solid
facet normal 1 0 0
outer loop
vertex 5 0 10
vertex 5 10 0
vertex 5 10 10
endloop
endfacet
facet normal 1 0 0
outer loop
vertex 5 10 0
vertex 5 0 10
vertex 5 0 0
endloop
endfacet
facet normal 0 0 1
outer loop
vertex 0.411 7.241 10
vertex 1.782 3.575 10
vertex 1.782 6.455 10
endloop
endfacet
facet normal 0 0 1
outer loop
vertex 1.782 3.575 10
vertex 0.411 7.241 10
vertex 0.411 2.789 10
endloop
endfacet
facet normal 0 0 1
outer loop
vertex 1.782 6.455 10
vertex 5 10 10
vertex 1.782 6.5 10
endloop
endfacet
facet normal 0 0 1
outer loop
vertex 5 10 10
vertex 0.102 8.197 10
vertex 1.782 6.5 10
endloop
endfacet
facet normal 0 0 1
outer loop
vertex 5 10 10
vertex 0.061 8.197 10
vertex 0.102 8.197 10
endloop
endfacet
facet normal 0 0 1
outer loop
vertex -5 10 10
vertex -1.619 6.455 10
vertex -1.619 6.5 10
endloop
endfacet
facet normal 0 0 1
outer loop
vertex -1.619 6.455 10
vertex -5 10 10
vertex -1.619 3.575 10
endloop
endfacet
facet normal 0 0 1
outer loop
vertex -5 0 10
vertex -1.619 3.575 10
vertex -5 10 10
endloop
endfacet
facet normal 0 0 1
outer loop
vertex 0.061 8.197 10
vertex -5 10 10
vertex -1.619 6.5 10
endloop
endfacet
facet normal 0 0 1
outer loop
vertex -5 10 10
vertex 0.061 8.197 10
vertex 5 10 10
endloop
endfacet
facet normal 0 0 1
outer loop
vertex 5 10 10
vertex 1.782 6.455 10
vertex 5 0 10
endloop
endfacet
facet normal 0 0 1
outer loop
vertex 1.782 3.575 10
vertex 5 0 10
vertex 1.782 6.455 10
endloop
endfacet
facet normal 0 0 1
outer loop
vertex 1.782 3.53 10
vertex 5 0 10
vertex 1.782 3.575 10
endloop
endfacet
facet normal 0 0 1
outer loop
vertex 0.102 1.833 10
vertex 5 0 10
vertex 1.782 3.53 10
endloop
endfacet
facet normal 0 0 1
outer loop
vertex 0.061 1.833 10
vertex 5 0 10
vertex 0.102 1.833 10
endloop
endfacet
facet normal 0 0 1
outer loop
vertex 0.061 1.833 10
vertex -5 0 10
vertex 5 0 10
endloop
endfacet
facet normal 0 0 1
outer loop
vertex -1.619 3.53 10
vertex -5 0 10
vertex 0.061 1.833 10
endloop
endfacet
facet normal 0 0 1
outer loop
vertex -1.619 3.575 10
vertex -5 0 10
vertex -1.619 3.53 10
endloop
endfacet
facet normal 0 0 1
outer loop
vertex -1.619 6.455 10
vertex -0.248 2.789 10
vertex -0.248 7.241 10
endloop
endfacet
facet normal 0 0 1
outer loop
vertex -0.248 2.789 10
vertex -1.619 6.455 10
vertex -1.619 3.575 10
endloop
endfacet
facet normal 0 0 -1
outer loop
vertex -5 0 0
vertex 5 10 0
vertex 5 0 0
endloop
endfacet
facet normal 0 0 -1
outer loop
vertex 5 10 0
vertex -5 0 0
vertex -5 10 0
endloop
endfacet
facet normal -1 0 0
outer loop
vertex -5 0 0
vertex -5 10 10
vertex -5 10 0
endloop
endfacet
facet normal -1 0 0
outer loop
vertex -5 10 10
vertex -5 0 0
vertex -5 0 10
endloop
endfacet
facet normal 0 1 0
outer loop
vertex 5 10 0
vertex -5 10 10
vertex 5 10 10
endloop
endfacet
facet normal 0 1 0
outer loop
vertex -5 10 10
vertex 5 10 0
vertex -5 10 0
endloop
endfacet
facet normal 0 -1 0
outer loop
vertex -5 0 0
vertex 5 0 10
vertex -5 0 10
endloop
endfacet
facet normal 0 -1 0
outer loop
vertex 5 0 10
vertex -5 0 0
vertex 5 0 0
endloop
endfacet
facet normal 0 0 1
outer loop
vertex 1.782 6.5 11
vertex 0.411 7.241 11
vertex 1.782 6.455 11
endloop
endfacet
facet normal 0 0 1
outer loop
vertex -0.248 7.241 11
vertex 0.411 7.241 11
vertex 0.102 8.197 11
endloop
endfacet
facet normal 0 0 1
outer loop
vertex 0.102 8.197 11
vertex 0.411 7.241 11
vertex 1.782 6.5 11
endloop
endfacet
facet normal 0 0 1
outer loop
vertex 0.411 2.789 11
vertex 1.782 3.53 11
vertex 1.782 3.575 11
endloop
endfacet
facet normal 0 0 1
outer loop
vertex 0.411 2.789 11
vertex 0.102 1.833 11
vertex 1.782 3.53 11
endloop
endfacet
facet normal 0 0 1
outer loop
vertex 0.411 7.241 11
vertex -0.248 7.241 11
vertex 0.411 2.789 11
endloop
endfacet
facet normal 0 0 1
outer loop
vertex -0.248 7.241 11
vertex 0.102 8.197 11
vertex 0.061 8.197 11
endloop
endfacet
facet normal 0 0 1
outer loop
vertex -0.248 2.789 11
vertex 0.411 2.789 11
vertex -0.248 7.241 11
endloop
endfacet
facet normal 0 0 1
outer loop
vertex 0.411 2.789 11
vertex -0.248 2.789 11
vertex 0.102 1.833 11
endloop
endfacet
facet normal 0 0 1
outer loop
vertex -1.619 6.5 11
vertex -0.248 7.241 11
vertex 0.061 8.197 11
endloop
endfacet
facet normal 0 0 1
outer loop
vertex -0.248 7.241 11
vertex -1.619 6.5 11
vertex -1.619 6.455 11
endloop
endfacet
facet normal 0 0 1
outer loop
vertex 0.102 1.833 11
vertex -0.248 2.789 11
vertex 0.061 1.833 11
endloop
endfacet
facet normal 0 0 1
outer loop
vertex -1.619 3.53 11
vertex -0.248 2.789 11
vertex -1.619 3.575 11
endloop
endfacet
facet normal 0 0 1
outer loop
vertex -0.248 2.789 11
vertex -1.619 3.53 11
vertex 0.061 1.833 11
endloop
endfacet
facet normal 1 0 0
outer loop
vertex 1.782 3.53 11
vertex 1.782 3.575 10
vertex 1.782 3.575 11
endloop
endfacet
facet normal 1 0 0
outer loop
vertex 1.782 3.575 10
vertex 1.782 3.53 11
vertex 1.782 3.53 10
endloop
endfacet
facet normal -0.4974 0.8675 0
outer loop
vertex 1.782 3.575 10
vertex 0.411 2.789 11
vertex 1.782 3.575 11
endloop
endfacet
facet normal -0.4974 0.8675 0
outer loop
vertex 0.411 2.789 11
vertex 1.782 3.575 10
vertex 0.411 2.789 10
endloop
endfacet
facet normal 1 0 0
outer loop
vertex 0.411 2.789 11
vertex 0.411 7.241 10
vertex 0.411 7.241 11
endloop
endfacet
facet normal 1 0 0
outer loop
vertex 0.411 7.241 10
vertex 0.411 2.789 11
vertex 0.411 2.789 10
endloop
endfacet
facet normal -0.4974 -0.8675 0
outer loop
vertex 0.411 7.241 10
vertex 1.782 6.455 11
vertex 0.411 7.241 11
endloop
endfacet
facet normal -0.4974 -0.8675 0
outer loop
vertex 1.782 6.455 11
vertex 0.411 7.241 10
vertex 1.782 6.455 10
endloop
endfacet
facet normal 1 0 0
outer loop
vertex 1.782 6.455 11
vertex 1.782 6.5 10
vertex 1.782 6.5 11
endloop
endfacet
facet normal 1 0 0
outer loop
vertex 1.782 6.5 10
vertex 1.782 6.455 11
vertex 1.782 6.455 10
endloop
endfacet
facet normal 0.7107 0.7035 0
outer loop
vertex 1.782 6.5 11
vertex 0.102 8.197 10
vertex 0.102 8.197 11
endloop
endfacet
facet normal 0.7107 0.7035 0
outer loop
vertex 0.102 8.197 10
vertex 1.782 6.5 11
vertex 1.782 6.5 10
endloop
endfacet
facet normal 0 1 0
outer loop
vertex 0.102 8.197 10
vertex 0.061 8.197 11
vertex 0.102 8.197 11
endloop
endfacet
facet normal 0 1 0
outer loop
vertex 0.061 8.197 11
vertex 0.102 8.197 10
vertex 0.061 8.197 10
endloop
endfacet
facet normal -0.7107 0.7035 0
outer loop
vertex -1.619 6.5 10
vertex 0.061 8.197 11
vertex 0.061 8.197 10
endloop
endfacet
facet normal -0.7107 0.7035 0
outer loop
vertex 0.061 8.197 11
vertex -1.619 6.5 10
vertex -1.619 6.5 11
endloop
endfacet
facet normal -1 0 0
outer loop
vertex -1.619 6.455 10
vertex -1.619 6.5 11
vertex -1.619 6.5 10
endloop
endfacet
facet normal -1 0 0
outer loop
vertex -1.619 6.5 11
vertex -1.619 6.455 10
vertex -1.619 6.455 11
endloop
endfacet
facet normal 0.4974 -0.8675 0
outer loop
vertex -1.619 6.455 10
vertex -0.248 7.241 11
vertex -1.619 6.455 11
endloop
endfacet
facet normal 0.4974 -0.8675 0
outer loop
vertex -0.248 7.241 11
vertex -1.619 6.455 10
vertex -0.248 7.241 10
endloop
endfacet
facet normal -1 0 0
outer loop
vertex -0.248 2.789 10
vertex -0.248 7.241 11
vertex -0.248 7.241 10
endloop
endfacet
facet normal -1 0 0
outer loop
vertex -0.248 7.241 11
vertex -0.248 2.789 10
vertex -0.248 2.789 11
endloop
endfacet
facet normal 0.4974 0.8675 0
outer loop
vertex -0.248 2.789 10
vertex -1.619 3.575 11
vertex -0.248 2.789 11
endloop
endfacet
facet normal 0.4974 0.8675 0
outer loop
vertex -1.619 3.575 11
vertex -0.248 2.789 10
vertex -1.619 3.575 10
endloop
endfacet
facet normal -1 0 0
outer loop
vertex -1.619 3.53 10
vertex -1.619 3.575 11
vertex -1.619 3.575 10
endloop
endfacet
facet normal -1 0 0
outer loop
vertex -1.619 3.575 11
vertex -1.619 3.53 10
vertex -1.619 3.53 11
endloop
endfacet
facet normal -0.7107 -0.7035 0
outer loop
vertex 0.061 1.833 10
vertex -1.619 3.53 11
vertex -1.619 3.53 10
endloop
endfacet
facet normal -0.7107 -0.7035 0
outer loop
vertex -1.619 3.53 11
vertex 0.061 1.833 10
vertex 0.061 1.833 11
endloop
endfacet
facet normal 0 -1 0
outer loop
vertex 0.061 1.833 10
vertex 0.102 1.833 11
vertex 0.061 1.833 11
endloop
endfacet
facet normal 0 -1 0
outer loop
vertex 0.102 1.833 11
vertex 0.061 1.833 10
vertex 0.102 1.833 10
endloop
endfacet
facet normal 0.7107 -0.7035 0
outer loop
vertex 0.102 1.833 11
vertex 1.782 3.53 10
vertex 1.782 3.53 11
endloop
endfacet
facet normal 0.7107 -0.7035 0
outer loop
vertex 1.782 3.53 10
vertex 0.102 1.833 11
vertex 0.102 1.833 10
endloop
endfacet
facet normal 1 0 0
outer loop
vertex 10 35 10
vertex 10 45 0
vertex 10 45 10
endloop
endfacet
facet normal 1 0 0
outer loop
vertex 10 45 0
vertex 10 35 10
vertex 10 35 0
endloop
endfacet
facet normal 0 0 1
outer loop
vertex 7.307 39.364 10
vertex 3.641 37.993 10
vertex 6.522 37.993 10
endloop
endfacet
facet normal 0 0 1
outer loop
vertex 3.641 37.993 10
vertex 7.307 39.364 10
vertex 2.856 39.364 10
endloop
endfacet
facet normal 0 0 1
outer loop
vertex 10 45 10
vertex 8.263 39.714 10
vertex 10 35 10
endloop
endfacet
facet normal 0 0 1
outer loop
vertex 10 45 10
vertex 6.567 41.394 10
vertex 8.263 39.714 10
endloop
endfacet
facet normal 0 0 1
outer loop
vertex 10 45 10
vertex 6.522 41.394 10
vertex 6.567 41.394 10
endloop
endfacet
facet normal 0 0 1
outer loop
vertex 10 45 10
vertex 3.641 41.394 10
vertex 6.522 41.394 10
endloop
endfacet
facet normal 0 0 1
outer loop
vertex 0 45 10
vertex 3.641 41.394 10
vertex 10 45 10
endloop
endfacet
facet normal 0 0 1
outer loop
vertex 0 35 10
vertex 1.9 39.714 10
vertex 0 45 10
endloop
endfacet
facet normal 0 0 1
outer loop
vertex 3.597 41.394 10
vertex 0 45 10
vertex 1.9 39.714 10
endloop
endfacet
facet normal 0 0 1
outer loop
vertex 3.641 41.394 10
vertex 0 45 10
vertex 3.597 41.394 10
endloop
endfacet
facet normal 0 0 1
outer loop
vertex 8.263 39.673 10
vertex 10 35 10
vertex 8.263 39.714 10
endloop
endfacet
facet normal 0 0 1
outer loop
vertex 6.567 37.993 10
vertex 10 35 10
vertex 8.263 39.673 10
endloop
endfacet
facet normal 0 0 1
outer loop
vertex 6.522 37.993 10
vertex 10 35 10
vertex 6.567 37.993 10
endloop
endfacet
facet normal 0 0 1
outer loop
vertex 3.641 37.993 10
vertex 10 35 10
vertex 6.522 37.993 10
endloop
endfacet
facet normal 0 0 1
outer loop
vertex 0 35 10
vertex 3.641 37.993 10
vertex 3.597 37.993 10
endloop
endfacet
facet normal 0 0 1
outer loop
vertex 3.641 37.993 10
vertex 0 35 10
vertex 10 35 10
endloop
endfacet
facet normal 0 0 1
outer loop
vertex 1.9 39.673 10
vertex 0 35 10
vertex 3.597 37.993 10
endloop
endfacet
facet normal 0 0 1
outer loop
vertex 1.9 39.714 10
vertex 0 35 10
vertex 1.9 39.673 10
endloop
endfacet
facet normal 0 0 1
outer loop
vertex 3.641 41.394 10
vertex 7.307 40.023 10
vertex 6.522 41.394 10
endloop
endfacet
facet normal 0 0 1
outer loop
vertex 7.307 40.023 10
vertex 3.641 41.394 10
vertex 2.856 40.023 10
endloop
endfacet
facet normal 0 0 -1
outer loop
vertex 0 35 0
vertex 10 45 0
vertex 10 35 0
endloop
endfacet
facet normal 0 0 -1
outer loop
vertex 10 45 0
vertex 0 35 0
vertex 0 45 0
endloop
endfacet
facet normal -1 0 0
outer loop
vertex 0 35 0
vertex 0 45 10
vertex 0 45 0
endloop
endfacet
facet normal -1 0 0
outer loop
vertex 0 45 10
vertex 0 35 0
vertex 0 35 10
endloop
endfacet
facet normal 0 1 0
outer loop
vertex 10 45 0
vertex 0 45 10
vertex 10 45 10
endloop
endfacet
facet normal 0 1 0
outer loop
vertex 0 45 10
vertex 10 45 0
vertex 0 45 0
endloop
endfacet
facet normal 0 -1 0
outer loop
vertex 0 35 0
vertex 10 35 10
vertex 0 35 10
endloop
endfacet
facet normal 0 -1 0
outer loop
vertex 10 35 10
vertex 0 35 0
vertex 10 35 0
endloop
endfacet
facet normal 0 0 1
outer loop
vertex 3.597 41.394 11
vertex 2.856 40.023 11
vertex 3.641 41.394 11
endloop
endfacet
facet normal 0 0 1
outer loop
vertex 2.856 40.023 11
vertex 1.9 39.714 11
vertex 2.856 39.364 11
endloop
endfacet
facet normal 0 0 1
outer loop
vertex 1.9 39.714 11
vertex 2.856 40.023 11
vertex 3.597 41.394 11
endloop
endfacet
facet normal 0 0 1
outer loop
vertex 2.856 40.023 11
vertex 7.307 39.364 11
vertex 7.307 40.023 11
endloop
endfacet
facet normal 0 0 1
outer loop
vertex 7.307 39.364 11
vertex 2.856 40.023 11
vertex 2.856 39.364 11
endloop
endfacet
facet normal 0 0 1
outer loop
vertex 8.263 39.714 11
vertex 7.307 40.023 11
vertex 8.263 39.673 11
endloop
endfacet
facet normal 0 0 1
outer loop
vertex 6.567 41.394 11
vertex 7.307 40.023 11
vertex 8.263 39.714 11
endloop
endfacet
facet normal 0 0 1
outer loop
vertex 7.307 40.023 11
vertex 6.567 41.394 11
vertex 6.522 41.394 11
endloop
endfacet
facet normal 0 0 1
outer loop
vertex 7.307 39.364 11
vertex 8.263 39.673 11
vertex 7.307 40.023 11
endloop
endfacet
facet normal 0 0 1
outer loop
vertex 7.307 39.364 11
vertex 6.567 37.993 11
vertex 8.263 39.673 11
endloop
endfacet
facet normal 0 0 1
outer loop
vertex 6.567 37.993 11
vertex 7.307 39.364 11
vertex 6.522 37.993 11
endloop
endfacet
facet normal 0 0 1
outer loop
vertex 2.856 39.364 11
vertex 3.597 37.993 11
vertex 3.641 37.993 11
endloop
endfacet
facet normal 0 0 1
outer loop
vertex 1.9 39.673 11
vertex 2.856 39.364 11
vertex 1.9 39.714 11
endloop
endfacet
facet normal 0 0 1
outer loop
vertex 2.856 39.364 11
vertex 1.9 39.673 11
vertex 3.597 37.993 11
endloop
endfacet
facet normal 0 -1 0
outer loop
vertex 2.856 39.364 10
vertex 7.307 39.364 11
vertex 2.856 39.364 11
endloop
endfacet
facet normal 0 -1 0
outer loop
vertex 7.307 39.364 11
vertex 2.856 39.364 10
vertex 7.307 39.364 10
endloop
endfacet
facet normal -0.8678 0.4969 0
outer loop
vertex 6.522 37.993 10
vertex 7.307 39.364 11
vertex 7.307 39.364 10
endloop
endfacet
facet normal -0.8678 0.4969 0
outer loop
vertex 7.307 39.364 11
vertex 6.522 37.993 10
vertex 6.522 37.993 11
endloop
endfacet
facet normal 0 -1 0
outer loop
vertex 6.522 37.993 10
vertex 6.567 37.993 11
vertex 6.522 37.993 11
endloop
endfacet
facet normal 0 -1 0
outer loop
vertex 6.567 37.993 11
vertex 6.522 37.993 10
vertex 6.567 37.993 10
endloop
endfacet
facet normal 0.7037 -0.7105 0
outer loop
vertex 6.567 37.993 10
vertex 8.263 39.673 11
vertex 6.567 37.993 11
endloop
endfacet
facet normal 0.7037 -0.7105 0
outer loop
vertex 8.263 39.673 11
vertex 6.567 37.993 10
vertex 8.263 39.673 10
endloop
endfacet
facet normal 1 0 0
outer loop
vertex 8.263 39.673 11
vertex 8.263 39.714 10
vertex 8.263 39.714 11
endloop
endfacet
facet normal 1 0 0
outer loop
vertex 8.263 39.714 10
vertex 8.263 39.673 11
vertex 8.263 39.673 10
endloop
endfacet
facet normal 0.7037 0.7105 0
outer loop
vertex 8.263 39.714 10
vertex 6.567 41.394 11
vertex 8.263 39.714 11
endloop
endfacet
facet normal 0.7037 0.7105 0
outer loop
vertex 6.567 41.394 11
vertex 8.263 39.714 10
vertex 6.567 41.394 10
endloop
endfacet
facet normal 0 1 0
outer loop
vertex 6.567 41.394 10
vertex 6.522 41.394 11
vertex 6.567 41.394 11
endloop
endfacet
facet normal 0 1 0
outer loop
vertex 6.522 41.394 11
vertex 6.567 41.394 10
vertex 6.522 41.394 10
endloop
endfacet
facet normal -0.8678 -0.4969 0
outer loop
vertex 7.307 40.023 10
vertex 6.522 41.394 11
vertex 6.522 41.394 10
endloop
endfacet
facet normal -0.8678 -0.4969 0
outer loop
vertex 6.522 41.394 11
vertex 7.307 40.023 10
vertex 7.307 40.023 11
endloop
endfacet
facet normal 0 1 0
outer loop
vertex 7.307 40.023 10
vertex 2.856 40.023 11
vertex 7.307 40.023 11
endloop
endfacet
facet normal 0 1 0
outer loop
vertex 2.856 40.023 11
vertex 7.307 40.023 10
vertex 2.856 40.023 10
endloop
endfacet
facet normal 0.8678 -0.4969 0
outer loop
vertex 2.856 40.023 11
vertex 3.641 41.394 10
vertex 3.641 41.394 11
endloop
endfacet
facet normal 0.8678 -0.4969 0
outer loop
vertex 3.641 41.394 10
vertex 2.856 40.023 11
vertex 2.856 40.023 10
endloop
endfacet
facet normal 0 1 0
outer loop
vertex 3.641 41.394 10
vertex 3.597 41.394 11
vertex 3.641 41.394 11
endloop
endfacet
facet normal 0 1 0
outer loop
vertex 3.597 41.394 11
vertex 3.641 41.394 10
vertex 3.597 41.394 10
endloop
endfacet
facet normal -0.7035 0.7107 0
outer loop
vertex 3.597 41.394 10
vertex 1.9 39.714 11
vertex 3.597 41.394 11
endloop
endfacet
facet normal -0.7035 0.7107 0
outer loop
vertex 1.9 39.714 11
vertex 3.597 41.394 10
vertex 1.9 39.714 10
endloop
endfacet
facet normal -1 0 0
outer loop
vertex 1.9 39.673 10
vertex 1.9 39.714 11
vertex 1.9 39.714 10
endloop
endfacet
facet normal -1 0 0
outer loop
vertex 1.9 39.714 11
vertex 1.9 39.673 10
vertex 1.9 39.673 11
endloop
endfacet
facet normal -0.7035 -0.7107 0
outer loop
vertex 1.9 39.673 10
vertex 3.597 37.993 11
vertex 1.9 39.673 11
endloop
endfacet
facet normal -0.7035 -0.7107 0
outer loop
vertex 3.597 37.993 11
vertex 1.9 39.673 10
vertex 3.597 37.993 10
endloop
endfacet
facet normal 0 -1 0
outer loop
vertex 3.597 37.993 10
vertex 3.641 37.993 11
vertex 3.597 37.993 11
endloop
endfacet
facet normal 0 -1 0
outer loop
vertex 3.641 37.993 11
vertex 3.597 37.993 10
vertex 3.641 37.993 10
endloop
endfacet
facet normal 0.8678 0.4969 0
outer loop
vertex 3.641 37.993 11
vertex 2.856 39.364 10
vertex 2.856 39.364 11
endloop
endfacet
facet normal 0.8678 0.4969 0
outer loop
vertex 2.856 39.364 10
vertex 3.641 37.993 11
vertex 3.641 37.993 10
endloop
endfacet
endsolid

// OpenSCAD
// -*- mode: SCAD ; c-file-style: "ellemtel" ; coding: utf-8 -*-
//
// Rough extruder offest calibration
// Extruder one part
// Just a few simple blocks
//
// (c) 2017 Roland Sieker <ospalh@gmail.com>
// Licence: CC-BY-SA 4.0



// Change this to fit your actual printer, as well as you know
nozzle_offset_x = 36;
nozzle_offset_y = 0.0;



font_name = "Demos LT";
// font_name = "Palatino";
// font_name = "serif";
// font_name = "bugger, haven't got this one";
font_name_2 = "Demos X";
font_name_3 = "serif";
some_distance = 40;



// Y
translate([-5, 0, 0])
{
   cube([10,10,10]);
   translate([5, 2, 10])
   {
      linear_extrude(1)
      {
         text("↕", 6, font=font_name_3, halign="center", valgin="center");
      }
   }
}



// X


translate([0, some_distance,0])
{
   translate([0, -5, 0])
   {
      cube([10,10,10]);
      translate([5, 2, 10])
      {
         linear_extrude(1)
         {
            text("↔", 6, font=font_name_3, halign="center", valgin="center");
         }
      }
   }
}
